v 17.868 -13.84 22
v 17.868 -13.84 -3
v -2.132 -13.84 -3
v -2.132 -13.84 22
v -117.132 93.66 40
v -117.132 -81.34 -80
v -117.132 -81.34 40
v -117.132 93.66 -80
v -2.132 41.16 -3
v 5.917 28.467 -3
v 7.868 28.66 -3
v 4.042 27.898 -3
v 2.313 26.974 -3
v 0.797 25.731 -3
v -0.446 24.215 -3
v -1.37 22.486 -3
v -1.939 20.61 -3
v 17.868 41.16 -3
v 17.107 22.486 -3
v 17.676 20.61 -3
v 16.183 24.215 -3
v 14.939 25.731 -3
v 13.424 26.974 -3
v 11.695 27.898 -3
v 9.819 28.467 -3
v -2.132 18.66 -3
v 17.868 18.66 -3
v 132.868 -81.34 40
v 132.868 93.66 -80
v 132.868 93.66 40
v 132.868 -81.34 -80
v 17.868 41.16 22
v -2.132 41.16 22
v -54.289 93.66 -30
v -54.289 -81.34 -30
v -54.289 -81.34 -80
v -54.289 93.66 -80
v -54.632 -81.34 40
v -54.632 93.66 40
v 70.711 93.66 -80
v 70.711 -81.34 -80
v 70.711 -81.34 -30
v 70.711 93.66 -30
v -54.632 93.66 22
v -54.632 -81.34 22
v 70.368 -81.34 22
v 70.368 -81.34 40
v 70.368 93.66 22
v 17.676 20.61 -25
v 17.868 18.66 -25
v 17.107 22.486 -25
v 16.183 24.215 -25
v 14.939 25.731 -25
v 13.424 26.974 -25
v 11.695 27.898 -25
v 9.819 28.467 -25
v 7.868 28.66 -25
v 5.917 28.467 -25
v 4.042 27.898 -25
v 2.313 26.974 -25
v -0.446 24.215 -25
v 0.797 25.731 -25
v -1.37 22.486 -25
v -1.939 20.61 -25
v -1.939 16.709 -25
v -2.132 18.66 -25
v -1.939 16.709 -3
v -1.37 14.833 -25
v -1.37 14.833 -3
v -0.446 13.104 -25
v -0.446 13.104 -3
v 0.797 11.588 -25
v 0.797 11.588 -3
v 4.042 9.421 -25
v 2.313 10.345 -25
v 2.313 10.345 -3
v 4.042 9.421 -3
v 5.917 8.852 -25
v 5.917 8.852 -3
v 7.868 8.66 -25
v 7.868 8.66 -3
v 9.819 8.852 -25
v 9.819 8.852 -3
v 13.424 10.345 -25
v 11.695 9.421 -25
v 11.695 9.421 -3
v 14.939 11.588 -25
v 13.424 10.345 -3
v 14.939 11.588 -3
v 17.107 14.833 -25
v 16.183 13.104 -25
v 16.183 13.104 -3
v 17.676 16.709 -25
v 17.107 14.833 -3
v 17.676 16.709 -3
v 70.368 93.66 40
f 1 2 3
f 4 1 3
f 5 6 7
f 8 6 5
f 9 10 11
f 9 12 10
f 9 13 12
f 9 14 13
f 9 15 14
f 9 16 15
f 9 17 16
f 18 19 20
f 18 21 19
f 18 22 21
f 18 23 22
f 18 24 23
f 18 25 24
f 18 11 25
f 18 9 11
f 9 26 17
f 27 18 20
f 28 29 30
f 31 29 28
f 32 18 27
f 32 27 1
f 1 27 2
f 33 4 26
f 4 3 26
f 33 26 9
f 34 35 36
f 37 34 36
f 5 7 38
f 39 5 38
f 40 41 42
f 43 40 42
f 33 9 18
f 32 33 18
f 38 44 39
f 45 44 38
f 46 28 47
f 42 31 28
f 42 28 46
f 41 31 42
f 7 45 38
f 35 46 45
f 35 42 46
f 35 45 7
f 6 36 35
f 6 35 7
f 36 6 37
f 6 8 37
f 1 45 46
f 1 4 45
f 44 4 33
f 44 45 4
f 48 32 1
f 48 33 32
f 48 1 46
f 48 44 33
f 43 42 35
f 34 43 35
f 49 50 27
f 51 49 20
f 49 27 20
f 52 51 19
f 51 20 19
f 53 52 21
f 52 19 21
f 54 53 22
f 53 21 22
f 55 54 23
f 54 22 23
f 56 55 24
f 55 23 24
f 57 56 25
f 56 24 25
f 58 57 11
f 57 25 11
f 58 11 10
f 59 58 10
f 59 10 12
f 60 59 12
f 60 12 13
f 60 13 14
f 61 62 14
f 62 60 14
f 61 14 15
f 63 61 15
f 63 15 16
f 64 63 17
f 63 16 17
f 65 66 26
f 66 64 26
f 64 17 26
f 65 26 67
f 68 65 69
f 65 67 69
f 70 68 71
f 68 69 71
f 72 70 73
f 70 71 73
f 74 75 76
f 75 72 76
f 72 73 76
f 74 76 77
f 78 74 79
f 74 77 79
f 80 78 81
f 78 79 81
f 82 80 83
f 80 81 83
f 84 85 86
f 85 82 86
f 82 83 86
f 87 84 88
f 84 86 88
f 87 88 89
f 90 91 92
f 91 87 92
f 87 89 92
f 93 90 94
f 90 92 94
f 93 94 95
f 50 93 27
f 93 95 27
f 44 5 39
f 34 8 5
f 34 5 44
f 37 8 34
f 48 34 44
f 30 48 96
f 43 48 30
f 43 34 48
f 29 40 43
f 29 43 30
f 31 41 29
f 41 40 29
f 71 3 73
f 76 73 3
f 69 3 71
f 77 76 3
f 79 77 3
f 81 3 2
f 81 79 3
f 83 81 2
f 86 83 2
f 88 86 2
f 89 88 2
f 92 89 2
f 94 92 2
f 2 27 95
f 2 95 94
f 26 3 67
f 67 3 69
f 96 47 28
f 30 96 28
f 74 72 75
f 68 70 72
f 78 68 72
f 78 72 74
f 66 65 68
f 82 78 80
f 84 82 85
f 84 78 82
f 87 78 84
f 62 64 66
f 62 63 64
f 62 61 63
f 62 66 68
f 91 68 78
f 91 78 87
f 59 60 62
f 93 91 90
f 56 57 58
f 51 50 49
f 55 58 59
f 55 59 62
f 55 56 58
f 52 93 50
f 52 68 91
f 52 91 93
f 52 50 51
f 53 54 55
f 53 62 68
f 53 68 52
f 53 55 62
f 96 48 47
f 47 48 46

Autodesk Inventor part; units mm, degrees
ref_plane "YZ Plane" through (0, 0, 0) normal (1, 0, 0) x (0, 1, 0)
ref_plane "XZ Plane" through (0, 0, 0) normal (0, 1, 0) x (-1, 0, 0)
ref_plane "XY Plane" through (0, 0, 0) normal (0, 0, 1) x (1, 0, 0)
sketch "Sketch1" plane through (0, 0, 0) normal (0, 0, 1) x (1, 0, 0)
  line L0 (-117.1316, 93.6595) -> (132.8684, 93.6595)
  line L1 (132.8684, 93.6595) -> (132.8684, -81.3405)
  line L2 (132.8684, -81.3405) -> (-117.1316, -81.3405)
  line L3 (-117.1316, -81.3405) -> (-117.1316, 93.6595)
  line L4 (-54.6316, 93.6595) -> (-54.6316, -81.3405)
  line L5 (70.3684, 93.6595) -> (70.3684, -81.3405)
  line L6 (-27.1316, 41.1595) -> (42.8684, 41.1595)
  line L7 (42.8684, 41.1595) -> (42.8684, -28.8405)
  line L8 (42.8684, -28.8405) -> (-27.1316, -28.8405)
  line L9 (-27.1316, -28.8405) -> (-27.1316, 41.1595)
  circle A0 centre (7.8684, 18.6595) radius 10
  line L10 (-2.1316, 41.1595) -> (17.8684, 41.1595)
  line L11 (17.8684, 41.1595) -> (17.8684, -13.8405)
  line L12 (17.8684, -13.8405) -> (-2.1316, -13.8405)
  line L13 (-2.1316, -13.8405) -> (-2.1316, 41.1595)
  point P0 (17.8684, 41.1595)
  point P1 (17.8684, 18.6595)
  point P2 (-2.1316, 18.6595)
  dimension "d0" = 250
  dimension "d1" = 175
  dimension "d2" = 62.5
  dimension "d3" = 62.5
  dimension "d8" = 70
  dimension "d9" = 70
  dimension "d10" = 52.5
  dimension "d11" = 27.5
  dimension "d12" = 20
  dimension "d19" = 20
  dimension "d20" = 55
  dimension "d21" = 25
extrude "Extrusion1" add sketch "Sketch1" along normal blind 40 and the other way blind 80 contours L0 L4 L2 L3 | L0 L1 L2 L5
extrude "Extrusion2" add sketch "Sketch1" along normal blind 22 and the other way blind 80 contours L0 L5 L2 L4 | L6 L13 L12 L11 L7 L8 L9 | L6 L11 A0 L13 | A0 | A0 L11 L12 L13
extrude "Extrusion3" cut sketch "Sketch1" along normal blind 22 and the other way blind 3 contours L6 L11 A0 L13 | A0 | A0 L11 L12 L13
extrude "Extrusion4" cut sketch "Sketch1" against normal blind 25 contours A0
sketch "Sketch3" plane through (-117.1316, -81.3405, -80) normal (0, -1, 0) x (1, 0, 0)
  line L0 (0, 0) -> (250, 0) projected
  line L1 (62.8423, 0) -> (187.8423, 0)
  line L2 (187.8423, 0) -> (187.8423, 50)
  line L3 (187.8423, 50) -> (62.8423, 50)
  line L4 (62.8423, 50) -> (62.8423, 0)
  point P0 (117.1316, 80)
  dimension "d22" = 125
  dimension "d23" = 50
extrude "Extrusion5" cut sketch "Sketch3" against normal through all
equation "\"d0\" = 5 * Product_dia"
equation "\"d1\" = 3.5 * Product_dia"
equation "\"d2\" = 0.25 * d0"
equation "\"d3\" = d2"
equation "\"d10\" = -0.5 * d9 + 0.5 * d1"
equation "\"d11\" = -0.5 * d8 + 0.5 * d0 - d2"
equation "\"d21\" = -0.5 * d19 + 0.5 * d8"
equation "\"ProductBaseHeight\" = 35"
equation "\"GridClearance\" = 3"
equation "\"GridBorderThickness\" = 5"
equation "\"GridTotalSize\" = 63"
equation "\"GridBorderFillets\" = 7"
equation "\"BaseTotalWidth\" = 352"
equation "\"GridProcutClearance\" = 3"
equation "\"Product_dia\" = 50"
